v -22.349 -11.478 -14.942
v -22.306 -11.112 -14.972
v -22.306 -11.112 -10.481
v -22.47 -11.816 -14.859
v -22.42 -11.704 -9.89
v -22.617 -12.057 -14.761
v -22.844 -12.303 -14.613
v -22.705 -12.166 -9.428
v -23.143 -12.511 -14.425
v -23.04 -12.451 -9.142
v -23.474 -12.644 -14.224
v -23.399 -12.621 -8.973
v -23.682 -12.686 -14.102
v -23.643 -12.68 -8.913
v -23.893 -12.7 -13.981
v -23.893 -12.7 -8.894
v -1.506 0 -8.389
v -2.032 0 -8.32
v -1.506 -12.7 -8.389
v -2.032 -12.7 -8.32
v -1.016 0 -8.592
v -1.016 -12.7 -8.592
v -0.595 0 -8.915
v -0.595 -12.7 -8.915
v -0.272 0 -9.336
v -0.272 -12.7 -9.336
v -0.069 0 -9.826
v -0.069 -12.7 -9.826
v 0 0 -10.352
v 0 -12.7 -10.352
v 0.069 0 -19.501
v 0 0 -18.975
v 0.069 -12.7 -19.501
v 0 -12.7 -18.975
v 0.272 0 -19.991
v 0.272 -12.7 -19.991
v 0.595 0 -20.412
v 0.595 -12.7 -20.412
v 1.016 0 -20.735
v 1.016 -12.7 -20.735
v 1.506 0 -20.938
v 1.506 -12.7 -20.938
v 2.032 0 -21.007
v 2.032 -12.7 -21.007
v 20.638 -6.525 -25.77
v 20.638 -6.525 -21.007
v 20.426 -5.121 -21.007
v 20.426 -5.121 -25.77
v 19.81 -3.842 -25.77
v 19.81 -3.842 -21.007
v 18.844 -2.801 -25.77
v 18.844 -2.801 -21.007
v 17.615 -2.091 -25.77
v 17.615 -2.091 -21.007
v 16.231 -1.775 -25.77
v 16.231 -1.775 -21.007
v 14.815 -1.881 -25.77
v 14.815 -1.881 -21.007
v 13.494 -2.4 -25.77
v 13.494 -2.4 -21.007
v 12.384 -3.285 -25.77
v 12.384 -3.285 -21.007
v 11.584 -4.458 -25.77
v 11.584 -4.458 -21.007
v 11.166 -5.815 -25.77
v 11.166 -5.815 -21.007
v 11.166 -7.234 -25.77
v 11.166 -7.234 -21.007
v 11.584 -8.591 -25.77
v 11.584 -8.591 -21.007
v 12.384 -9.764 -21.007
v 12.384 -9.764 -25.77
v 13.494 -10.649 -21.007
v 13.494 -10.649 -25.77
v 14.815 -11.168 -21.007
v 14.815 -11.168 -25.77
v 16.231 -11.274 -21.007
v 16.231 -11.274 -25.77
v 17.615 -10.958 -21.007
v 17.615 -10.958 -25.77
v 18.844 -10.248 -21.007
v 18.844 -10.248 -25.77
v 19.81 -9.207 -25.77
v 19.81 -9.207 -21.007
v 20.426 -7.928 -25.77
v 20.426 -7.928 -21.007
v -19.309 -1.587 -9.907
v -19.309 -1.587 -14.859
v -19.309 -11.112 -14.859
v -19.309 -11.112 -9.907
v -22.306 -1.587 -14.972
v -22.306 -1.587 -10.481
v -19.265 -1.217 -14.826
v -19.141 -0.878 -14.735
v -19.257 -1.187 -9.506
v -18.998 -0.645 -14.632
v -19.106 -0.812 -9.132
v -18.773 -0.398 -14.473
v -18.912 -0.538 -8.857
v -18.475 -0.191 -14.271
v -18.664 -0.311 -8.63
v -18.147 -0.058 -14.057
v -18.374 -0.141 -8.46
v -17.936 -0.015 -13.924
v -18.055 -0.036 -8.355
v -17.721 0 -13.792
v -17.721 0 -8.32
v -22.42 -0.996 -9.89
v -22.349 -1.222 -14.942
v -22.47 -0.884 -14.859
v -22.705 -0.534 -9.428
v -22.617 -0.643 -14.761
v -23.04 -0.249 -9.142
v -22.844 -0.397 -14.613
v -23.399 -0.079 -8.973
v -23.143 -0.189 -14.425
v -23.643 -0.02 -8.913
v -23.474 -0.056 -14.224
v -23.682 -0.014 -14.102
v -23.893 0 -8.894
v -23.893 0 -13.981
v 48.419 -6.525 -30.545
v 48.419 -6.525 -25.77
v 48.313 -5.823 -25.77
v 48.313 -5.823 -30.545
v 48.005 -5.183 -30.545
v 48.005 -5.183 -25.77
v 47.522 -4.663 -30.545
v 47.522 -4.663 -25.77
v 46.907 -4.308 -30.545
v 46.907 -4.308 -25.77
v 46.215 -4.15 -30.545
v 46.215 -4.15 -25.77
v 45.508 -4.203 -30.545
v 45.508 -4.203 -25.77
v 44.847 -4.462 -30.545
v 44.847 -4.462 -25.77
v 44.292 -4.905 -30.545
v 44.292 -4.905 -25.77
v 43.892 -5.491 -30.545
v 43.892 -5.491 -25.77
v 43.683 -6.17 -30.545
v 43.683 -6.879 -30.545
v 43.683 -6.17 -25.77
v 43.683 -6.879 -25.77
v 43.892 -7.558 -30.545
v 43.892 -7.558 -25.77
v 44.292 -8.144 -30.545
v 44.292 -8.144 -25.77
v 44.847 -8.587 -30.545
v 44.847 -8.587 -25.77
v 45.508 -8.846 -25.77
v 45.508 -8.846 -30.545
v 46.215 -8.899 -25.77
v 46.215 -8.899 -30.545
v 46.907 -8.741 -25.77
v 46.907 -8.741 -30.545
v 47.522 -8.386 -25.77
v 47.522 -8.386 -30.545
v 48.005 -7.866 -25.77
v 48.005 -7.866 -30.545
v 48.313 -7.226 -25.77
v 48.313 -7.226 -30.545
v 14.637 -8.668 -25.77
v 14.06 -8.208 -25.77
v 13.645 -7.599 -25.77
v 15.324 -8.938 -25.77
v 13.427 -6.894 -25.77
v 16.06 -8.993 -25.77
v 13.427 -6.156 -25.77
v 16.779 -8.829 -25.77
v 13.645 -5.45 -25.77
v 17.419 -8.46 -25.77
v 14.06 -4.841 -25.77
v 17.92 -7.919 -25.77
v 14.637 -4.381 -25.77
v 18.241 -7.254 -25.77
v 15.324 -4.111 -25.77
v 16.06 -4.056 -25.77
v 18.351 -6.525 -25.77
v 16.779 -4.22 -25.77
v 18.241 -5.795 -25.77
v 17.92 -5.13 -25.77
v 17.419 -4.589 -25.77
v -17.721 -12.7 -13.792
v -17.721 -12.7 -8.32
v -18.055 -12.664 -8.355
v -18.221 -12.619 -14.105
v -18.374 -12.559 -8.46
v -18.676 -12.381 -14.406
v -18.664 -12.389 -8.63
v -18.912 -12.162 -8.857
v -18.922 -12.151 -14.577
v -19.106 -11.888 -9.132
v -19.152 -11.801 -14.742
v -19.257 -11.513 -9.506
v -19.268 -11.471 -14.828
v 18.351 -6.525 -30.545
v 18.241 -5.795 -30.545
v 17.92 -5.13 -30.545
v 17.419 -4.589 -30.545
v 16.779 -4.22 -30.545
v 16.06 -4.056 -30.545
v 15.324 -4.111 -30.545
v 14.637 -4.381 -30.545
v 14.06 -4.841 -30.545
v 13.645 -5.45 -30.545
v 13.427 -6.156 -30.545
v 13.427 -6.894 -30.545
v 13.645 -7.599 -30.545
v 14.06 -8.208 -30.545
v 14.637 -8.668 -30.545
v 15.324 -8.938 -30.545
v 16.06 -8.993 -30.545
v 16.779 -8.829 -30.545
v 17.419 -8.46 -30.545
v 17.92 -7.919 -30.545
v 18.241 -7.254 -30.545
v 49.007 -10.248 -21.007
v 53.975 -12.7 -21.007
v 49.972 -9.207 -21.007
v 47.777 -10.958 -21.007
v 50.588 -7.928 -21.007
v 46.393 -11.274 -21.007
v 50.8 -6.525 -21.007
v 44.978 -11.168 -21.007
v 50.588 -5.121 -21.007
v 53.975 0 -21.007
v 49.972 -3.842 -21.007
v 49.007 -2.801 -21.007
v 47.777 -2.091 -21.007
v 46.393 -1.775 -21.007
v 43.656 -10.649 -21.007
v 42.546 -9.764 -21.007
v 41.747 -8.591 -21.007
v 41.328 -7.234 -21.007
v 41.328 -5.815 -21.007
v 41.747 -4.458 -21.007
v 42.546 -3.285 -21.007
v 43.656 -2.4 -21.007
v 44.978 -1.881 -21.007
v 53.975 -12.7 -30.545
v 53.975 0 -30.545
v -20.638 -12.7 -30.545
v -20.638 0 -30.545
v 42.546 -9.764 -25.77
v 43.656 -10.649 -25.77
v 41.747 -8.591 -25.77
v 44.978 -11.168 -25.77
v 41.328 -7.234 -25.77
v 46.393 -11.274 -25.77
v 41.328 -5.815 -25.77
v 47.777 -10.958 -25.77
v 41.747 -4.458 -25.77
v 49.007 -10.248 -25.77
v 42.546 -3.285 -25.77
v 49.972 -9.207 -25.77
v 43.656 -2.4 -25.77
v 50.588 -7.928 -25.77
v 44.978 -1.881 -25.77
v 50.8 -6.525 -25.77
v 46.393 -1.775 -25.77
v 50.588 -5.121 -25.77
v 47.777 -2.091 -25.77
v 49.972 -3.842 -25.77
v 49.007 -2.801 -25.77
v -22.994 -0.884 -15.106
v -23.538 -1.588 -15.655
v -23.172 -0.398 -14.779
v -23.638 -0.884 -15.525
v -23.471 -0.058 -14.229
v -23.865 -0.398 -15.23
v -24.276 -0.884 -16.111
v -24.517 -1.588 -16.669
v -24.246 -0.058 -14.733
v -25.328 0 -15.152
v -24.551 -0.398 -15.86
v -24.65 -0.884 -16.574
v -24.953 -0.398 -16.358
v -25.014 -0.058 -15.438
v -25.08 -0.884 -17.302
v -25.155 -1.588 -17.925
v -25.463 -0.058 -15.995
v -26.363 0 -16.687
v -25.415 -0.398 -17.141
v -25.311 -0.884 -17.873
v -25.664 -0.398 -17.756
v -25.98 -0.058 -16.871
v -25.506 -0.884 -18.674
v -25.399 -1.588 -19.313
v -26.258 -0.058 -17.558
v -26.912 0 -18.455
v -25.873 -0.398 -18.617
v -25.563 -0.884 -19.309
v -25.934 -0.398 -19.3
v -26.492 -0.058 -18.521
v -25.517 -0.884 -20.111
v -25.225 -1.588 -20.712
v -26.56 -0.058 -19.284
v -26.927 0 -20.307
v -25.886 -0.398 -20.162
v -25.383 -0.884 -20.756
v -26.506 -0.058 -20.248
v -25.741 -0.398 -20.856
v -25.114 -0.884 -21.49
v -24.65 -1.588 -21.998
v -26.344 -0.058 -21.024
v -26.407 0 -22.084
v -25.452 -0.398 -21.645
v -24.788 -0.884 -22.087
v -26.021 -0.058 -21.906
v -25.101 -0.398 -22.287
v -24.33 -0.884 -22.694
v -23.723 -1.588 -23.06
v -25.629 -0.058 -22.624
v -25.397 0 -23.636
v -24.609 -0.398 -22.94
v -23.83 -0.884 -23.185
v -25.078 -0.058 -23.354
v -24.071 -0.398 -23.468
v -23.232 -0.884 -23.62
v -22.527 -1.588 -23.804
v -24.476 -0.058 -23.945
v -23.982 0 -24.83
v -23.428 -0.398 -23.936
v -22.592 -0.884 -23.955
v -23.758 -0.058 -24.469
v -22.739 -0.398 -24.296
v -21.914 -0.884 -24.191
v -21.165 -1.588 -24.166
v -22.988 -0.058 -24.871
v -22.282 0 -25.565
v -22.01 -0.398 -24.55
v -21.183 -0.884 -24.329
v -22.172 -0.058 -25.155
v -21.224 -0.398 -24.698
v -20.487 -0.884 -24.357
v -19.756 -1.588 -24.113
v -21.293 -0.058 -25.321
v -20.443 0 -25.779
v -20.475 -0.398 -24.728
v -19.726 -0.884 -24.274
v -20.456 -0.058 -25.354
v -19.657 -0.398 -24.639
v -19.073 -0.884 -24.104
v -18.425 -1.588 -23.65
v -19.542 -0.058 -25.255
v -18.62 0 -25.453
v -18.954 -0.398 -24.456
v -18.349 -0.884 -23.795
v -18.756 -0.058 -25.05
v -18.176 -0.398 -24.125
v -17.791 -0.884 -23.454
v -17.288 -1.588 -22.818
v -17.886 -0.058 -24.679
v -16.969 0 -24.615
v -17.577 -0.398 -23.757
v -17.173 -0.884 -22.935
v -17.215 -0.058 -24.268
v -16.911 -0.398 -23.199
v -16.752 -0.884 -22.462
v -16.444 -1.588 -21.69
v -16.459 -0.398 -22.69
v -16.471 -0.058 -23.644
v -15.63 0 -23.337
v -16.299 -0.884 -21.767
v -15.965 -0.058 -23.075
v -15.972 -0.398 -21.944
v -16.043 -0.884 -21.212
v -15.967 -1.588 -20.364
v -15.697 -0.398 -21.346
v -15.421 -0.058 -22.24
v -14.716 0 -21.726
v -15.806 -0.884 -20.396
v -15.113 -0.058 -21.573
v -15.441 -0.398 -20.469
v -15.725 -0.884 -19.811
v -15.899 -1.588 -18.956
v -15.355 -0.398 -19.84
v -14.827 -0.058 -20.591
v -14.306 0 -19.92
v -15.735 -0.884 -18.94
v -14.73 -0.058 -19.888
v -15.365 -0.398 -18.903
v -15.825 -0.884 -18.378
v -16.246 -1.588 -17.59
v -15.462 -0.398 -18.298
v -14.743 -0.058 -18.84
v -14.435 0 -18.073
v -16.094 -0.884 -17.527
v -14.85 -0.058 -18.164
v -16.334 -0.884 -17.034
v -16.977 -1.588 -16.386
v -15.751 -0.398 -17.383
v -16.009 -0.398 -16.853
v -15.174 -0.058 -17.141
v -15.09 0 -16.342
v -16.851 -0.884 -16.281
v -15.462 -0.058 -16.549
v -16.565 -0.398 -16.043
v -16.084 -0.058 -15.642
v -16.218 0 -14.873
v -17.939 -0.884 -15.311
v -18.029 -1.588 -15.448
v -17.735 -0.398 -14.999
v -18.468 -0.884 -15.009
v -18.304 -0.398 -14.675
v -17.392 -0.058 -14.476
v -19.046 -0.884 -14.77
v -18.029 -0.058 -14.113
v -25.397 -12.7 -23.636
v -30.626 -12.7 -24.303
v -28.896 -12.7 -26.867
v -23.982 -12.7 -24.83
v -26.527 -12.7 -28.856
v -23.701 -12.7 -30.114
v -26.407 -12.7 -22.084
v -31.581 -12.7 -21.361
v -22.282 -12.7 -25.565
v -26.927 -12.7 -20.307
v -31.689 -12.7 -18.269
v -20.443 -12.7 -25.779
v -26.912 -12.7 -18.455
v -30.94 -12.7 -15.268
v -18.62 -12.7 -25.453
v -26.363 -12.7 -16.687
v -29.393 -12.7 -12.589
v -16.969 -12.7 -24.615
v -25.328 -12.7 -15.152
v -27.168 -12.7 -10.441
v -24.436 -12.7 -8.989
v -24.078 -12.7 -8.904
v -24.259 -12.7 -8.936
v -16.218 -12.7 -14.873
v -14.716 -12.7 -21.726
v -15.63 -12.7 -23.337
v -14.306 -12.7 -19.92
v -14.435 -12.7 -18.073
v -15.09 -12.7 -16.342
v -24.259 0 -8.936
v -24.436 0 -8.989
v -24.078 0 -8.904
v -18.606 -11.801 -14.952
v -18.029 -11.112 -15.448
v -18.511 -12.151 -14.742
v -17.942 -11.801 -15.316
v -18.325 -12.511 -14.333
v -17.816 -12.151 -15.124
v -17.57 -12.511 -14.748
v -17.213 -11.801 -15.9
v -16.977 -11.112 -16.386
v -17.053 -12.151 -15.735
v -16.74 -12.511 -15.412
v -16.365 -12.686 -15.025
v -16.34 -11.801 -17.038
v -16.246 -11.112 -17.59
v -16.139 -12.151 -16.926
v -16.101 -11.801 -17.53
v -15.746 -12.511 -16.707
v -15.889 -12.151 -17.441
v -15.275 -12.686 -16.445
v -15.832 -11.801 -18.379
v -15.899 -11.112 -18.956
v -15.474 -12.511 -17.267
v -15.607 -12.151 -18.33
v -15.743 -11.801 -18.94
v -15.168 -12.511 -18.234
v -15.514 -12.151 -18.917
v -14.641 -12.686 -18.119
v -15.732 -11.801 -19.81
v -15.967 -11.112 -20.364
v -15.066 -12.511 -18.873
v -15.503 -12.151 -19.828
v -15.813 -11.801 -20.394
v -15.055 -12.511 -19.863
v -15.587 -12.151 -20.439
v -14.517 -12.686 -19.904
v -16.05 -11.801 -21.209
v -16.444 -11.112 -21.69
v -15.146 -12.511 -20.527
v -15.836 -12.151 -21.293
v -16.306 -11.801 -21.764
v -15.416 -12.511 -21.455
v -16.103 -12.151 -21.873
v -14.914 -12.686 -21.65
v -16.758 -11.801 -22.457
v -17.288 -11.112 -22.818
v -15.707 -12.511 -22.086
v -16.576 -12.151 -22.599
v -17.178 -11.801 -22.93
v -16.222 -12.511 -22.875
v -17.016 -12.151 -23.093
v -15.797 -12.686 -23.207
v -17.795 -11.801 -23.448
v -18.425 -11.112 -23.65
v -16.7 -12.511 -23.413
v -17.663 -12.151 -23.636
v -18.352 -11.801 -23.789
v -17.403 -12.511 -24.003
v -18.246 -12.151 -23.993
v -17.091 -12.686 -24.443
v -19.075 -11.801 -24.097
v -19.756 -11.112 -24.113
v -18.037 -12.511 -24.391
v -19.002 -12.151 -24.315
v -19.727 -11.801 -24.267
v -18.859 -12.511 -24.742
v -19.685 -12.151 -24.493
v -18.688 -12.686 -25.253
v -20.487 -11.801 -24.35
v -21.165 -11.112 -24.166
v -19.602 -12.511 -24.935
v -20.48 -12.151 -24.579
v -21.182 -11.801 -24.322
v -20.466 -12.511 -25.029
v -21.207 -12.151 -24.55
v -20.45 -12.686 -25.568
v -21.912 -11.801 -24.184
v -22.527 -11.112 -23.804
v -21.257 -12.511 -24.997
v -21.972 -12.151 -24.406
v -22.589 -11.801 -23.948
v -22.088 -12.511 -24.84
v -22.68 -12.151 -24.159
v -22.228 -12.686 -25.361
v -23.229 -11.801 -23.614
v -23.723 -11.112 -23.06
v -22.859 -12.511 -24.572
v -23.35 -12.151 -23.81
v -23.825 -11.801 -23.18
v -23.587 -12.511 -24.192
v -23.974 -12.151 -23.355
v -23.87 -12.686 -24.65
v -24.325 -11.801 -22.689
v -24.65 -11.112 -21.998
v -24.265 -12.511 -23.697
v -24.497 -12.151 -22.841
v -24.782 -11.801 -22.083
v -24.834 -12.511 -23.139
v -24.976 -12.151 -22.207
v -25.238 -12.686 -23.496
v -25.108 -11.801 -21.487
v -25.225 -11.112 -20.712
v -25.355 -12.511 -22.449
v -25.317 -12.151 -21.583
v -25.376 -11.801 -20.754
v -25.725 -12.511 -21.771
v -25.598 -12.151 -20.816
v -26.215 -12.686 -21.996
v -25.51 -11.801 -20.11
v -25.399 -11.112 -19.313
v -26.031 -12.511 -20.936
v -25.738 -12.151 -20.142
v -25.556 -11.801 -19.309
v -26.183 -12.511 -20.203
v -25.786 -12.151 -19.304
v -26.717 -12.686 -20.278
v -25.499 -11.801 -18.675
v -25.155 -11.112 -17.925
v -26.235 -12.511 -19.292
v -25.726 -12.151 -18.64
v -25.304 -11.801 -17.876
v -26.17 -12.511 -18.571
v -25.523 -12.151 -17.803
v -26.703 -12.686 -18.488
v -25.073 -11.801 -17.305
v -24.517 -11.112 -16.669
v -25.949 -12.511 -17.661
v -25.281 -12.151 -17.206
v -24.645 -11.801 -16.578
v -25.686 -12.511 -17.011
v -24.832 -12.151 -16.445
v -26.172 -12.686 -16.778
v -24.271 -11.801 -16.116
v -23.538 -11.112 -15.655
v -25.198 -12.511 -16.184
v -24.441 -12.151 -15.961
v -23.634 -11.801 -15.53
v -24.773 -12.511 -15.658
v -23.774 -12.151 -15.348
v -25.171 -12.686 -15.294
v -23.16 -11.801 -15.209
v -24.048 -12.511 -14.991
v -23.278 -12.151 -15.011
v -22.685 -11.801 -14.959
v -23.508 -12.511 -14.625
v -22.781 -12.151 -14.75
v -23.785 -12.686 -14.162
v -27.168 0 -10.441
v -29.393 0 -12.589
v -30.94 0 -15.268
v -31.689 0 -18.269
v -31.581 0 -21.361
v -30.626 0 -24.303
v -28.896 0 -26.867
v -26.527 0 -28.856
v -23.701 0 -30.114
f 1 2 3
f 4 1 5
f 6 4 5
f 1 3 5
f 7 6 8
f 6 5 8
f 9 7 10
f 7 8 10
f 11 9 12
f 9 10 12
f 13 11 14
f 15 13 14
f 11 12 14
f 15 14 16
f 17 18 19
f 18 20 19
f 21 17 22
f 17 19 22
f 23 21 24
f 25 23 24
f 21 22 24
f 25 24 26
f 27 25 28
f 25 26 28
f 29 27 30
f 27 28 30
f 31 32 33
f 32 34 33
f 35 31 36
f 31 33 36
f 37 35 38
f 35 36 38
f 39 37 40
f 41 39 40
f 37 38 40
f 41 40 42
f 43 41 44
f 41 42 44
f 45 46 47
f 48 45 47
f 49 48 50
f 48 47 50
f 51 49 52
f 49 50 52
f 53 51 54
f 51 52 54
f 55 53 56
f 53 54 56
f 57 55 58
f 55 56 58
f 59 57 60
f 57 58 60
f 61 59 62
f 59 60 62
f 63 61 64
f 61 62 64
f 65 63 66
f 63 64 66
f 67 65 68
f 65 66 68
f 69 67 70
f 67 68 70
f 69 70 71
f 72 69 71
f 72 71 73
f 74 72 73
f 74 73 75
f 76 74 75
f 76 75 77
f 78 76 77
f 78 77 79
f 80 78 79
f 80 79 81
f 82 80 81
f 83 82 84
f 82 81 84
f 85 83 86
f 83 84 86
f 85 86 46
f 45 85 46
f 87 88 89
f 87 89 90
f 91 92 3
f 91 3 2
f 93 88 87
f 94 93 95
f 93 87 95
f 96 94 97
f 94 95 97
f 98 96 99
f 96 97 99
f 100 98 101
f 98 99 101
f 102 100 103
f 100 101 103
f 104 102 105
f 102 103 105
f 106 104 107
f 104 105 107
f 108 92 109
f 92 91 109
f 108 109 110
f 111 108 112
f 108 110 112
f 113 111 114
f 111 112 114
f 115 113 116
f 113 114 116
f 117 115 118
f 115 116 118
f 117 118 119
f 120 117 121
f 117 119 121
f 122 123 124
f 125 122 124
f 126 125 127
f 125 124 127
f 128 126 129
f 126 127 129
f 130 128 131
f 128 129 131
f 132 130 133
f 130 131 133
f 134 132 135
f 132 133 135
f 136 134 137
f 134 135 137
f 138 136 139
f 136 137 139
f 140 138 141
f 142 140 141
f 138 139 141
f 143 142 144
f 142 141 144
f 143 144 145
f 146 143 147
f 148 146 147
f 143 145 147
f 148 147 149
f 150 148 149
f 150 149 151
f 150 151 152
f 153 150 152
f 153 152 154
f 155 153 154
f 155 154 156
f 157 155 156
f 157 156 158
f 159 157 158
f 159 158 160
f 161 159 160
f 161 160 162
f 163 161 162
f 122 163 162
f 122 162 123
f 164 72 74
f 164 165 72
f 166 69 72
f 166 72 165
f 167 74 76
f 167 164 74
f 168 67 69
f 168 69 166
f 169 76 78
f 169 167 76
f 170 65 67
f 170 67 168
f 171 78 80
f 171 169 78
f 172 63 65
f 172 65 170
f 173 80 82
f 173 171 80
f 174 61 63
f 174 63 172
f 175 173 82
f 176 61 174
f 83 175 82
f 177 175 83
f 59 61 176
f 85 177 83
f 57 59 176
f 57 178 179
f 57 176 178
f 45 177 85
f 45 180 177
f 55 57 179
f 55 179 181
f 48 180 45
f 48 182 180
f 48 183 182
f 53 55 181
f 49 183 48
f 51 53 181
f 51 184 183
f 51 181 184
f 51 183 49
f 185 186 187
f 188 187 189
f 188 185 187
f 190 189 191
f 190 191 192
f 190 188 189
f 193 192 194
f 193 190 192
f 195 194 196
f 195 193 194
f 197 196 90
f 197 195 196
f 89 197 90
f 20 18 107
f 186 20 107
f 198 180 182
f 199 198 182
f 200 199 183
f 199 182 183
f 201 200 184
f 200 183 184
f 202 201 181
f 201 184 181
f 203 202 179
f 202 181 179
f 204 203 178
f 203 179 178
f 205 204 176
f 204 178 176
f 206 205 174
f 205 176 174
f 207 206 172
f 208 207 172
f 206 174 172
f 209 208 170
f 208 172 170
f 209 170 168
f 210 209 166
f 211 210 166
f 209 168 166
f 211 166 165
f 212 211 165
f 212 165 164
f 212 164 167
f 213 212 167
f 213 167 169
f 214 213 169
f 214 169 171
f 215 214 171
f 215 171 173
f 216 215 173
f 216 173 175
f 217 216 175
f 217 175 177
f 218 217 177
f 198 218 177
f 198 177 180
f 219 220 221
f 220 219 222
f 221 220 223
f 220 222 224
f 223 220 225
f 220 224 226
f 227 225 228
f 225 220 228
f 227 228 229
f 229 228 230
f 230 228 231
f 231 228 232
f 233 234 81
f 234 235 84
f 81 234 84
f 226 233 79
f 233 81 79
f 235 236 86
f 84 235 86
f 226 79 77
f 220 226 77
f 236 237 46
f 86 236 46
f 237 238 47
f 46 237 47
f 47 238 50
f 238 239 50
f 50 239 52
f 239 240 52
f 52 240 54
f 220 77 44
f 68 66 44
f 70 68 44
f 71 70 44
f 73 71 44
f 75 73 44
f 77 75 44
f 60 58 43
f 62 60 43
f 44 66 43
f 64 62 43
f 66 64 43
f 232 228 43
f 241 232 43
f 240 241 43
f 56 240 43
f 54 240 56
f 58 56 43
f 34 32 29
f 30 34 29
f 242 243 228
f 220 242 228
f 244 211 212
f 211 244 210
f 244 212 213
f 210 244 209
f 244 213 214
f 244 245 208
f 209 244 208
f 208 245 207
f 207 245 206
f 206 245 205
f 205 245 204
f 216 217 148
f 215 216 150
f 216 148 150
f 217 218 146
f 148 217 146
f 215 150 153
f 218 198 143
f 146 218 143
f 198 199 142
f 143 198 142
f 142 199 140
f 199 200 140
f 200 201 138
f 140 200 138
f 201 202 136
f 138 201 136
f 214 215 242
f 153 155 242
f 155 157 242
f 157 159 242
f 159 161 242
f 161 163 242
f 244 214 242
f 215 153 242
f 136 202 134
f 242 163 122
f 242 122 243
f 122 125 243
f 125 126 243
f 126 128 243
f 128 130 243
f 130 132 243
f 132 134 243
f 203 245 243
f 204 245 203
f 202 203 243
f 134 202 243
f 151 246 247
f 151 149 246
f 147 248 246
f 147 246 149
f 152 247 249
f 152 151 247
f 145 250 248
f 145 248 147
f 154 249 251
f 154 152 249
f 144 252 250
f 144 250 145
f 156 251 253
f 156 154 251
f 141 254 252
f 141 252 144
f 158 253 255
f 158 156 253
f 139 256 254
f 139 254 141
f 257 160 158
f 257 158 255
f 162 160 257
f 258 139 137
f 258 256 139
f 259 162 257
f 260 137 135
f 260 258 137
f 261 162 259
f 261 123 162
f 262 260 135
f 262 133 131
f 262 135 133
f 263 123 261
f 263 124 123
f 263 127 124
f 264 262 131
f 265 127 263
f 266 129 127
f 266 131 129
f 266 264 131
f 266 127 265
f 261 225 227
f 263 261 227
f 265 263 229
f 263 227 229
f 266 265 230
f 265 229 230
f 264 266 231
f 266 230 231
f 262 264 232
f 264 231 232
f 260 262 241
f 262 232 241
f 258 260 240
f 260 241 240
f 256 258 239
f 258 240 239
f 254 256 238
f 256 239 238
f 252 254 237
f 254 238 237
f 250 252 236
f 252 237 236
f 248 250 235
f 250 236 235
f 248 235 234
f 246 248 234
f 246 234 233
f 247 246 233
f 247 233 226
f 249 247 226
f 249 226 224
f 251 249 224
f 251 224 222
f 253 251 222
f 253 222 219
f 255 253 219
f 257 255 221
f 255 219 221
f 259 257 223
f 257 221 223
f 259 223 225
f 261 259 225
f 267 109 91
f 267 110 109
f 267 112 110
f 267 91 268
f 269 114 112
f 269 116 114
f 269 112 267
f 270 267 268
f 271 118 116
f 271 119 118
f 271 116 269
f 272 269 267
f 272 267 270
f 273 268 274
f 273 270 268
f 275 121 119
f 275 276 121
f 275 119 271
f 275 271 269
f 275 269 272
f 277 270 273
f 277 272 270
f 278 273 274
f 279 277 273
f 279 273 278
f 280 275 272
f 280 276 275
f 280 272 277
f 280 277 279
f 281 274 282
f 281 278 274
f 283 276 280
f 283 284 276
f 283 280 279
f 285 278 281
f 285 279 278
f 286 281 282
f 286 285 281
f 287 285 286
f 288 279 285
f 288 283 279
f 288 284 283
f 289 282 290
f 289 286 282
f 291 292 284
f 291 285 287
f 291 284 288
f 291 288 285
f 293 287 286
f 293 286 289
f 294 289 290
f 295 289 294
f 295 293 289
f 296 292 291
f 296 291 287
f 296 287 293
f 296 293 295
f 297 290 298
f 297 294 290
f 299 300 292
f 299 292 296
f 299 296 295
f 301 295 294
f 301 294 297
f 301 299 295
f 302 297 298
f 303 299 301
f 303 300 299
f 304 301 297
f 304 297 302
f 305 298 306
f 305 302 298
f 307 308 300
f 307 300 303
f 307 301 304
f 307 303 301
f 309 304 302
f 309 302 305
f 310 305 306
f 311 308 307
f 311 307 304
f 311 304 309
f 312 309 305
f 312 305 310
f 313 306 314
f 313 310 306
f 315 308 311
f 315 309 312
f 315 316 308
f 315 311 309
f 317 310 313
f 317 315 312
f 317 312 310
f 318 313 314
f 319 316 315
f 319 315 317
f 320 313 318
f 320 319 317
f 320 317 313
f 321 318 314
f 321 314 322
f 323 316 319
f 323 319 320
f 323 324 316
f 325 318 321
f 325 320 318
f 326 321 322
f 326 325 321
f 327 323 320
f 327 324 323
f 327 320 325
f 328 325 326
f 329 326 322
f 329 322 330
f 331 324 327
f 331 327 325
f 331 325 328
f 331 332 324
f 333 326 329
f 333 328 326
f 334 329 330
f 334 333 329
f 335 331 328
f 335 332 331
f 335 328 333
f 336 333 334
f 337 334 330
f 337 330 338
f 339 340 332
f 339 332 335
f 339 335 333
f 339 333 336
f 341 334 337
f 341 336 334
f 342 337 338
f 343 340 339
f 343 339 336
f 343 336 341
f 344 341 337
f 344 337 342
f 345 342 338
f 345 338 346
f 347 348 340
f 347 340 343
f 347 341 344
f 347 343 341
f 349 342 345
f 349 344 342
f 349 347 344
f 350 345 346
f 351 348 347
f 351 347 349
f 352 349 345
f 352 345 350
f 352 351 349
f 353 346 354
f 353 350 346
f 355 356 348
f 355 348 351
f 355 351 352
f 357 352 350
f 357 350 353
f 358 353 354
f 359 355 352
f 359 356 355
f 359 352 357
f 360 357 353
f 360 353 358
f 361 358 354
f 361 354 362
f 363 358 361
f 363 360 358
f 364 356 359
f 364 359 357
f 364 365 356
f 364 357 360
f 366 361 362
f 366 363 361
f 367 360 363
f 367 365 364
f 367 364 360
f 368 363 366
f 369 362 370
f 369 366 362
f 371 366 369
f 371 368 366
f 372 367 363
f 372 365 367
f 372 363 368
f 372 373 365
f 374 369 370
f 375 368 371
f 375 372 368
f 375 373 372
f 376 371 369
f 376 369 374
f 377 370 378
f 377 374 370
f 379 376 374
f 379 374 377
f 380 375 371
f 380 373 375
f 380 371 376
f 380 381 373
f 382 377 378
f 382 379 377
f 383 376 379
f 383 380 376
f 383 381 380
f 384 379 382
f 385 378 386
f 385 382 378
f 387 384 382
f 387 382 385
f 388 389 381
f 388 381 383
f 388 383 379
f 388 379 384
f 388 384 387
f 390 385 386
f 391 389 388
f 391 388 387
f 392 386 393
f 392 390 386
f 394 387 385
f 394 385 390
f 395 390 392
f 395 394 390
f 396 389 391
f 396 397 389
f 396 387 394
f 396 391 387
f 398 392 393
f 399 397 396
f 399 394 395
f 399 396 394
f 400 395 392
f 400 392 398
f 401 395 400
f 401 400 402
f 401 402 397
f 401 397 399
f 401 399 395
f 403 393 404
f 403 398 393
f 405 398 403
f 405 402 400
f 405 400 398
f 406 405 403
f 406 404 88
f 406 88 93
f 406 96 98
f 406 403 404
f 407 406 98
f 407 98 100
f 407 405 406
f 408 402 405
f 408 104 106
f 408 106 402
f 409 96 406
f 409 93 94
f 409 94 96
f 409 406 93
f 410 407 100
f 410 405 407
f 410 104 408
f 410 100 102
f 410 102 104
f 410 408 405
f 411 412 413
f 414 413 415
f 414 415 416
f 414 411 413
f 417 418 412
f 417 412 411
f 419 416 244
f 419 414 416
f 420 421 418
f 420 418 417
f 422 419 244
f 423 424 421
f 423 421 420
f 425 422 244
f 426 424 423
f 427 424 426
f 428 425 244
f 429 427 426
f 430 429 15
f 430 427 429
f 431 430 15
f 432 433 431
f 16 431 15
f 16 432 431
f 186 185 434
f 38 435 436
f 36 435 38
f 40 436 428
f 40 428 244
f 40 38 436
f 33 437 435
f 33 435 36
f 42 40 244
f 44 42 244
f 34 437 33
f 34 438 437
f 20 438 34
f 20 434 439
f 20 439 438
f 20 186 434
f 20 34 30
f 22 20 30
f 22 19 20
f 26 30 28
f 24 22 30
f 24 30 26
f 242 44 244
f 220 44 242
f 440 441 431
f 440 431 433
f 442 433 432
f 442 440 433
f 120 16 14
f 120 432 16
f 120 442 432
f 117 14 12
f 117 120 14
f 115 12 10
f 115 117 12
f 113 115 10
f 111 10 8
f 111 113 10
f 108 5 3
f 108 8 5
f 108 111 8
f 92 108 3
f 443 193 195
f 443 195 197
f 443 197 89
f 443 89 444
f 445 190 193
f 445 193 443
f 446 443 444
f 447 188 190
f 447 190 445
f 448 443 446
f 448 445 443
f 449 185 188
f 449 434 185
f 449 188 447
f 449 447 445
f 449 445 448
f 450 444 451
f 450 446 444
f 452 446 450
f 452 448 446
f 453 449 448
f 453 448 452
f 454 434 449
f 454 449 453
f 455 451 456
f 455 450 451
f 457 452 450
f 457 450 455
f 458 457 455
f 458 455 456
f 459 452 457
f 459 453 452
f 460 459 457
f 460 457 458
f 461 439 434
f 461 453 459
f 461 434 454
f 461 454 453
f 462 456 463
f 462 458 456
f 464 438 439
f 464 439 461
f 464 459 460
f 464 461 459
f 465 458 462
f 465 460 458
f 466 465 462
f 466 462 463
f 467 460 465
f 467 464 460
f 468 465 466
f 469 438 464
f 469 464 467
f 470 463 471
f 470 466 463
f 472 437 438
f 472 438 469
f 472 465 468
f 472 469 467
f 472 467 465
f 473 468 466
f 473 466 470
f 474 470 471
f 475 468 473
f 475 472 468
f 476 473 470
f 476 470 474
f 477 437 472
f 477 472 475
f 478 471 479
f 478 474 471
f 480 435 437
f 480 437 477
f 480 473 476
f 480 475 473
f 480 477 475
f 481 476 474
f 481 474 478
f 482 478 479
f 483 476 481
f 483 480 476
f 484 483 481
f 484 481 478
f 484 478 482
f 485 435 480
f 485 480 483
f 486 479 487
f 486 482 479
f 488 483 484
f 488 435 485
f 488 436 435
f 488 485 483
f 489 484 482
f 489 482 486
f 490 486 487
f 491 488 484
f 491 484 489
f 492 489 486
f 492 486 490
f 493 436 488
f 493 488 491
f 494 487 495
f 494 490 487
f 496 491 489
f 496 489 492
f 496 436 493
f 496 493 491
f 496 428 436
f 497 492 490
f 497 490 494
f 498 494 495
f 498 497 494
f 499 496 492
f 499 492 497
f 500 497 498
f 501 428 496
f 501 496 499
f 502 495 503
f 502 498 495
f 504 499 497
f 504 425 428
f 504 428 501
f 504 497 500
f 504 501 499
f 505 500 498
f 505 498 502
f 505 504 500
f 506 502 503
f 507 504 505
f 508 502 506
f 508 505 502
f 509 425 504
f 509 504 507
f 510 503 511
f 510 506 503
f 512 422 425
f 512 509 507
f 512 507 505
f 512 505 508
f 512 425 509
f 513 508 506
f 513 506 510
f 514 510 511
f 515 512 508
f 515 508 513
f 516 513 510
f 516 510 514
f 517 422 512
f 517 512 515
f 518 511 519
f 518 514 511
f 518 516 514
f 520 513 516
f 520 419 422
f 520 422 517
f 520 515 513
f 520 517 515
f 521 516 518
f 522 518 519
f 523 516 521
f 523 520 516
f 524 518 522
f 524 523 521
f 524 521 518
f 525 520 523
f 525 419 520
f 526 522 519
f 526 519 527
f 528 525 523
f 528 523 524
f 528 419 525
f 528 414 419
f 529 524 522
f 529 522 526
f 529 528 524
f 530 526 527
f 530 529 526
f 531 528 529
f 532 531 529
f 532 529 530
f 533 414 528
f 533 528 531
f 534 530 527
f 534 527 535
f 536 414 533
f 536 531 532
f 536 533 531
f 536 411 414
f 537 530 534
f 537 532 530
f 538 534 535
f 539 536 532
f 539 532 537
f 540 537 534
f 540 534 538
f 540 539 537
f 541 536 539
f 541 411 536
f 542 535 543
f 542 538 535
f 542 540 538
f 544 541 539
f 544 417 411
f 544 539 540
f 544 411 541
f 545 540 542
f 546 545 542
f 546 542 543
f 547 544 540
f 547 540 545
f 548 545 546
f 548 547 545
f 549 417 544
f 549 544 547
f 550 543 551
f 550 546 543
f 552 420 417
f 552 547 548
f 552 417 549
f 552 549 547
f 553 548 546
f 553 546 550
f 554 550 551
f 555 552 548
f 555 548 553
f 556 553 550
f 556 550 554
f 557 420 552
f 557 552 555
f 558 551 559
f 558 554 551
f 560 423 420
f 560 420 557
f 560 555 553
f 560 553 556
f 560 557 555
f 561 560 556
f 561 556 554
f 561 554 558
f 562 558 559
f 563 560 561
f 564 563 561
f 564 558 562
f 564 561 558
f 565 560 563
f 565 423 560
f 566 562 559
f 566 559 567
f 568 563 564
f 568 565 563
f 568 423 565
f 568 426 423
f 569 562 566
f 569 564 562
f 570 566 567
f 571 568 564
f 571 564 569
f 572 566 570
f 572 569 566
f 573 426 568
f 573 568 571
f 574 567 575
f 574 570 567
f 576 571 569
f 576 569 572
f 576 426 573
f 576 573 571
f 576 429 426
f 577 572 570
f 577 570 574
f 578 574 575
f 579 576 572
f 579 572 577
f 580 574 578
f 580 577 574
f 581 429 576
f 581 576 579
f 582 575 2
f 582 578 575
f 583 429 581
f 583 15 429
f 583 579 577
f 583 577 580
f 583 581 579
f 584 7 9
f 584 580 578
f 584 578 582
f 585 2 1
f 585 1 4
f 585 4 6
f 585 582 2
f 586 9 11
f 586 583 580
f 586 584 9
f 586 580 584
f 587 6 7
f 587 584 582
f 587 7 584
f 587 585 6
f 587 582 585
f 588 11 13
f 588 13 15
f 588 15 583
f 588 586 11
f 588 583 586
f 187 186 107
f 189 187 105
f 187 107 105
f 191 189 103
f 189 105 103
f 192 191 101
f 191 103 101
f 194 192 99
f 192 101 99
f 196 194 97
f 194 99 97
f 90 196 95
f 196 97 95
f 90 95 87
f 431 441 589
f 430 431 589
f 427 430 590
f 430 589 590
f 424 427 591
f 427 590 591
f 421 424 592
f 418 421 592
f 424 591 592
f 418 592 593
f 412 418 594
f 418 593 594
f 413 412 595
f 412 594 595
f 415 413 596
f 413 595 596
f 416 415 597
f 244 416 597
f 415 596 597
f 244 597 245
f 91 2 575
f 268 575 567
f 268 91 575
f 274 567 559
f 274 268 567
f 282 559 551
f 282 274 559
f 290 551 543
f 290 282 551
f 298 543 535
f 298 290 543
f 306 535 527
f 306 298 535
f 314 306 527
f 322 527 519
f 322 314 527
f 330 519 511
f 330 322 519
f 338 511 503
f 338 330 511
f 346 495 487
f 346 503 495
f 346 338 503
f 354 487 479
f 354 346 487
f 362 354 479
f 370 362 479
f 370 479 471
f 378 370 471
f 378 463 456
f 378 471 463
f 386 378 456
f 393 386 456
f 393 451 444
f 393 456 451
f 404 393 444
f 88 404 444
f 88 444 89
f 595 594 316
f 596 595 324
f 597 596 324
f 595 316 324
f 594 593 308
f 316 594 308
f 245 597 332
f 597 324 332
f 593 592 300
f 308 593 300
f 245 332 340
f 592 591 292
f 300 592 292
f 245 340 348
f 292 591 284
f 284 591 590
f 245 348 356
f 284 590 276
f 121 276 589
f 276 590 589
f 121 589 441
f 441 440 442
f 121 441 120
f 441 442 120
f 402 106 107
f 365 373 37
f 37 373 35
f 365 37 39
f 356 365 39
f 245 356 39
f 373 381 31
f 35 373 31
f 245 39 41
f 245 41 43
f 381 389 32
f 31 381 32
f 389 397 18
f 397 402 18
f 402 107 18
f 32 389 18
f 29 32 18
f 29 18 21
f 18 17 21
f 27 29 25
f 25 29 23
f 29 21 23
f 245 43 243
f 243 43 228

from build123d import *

# Parameters (mm, degrees)
F0_R     = 4.7625
F1_DEPTH = 12.7
F3_DEPTH = 12.701
F4_R     = 1.5875
F5_R     = 2.38125
F5_R_2   = 2.4756195987
F6_DEPTH = 101.6
F7_R     = 4.7625
F8_DEPTH = 4.7625
F9_DEPTH = 36.322
F10_R    = 2.032


with BuildPart() as f1:
    # F0 (on Front) → F1 (new body)
    with BuildSketch(Plane.XZ):
        with BuildLine():
            Line((0, -8.3197675008), (-20.6375, -8.3197675008))
            ThreePointArc((-20.6375, -8.3197675008), (-31.75, -19.4322675008), (-20.6375, -30.5447675008))
            Line((-20.6375, -30.5447675008), (4.7625, -30.5447675008))
            Line((4.7625, -30.5447675008), (53.975, -30.5447675008))
            Line((53.975, -30.5447675008), (53.975, -21.0070675008))
            Line((53.975, -21.0070675008), (0, -21.0070675008))
            Line((0, -21.0070675008), (0, -8.3197675008))
        make_face()
        with Locations((-20.6375, -19.4322675008)):
            Circle(F0_R, mode=Mode.SUBTRACT)
    extrude(amount=F1_DEPTH)

    # F2 (on Front) → F3 (cut, through all)
    with BuildSketch(Plane.XZ):
        Polygon((-19.3086979003, -7.7764257723), (-22.3058979003, -7.62272316), (-22.3058979003, -16.6143205299), (-19.3086979003, -16.6143205299), align=None)
    extrude(amount=F3_DEPTH, mode=Mode.SUBTRACT)

    # F4
    f4_edges = [f1.edges().sort_by_distance(p)[0] for p in [
        (-19.308698, -6.35, -8.319768),
        (-22.305898, -6.35, -8.445726),
        (-22.305898, -12.7, -11.708646),
        (-19.308698, -12.7, -11.589334),
        (-20.458601, -12.7, -24.191406),
        (-19.308698, 0, -11.589334),
        (-22.305898, 0, -11.708646),
        (-20.458601, 0, -24.191406),
    ]]
    fillet(f4_edges, radius=F4_R)

    # F5 (on Top) → F6 (cut)
    with BuildSketch(Plane.XY):
        with Locations((46.0375, -6.5245353617)):
            Circle(F5_R)
        with Locations((15.875, -6.5245353617)):
            Circle(F5_R_2)
    extrude(amount=F6_DEPTH, mode=Mode.SUBTRACT)

    # F7 (on face) → F8 (cut)
    with BuildSketch(Plane.XY.offset(-21.0070675008)):
        with Locations((15.875, -6.5245353617)):
            Circle(F7_R)
        with Locations((46.0375, -6.5245353617)):
            Circle(F7_R)
    extrude(amount=-F8_DEPTH, mode=Mode.SUBTRACT)

    # F5 (on Top) → F9 (cut)
    with BuildSketch(Plane.XY):
        with Locations((15.875, -6.5245353617)):
            Circle(F5_R_2)
        with Locations((46.0375, -6.5245353617)):
            Circle(F5_R)
    extrude(amount=-F9_DEPTH, mode=Mode.SUBTRACT)

    # F10
    f10_edges = [f1.edges().sort_by_distance(p)[0] for p in [
        (0, -6.35, -8.319768),
        (0, -6.35, -21.007068),
    ]]
    fillet(f10_edges, radius=F10_R)


solid = f1.part
